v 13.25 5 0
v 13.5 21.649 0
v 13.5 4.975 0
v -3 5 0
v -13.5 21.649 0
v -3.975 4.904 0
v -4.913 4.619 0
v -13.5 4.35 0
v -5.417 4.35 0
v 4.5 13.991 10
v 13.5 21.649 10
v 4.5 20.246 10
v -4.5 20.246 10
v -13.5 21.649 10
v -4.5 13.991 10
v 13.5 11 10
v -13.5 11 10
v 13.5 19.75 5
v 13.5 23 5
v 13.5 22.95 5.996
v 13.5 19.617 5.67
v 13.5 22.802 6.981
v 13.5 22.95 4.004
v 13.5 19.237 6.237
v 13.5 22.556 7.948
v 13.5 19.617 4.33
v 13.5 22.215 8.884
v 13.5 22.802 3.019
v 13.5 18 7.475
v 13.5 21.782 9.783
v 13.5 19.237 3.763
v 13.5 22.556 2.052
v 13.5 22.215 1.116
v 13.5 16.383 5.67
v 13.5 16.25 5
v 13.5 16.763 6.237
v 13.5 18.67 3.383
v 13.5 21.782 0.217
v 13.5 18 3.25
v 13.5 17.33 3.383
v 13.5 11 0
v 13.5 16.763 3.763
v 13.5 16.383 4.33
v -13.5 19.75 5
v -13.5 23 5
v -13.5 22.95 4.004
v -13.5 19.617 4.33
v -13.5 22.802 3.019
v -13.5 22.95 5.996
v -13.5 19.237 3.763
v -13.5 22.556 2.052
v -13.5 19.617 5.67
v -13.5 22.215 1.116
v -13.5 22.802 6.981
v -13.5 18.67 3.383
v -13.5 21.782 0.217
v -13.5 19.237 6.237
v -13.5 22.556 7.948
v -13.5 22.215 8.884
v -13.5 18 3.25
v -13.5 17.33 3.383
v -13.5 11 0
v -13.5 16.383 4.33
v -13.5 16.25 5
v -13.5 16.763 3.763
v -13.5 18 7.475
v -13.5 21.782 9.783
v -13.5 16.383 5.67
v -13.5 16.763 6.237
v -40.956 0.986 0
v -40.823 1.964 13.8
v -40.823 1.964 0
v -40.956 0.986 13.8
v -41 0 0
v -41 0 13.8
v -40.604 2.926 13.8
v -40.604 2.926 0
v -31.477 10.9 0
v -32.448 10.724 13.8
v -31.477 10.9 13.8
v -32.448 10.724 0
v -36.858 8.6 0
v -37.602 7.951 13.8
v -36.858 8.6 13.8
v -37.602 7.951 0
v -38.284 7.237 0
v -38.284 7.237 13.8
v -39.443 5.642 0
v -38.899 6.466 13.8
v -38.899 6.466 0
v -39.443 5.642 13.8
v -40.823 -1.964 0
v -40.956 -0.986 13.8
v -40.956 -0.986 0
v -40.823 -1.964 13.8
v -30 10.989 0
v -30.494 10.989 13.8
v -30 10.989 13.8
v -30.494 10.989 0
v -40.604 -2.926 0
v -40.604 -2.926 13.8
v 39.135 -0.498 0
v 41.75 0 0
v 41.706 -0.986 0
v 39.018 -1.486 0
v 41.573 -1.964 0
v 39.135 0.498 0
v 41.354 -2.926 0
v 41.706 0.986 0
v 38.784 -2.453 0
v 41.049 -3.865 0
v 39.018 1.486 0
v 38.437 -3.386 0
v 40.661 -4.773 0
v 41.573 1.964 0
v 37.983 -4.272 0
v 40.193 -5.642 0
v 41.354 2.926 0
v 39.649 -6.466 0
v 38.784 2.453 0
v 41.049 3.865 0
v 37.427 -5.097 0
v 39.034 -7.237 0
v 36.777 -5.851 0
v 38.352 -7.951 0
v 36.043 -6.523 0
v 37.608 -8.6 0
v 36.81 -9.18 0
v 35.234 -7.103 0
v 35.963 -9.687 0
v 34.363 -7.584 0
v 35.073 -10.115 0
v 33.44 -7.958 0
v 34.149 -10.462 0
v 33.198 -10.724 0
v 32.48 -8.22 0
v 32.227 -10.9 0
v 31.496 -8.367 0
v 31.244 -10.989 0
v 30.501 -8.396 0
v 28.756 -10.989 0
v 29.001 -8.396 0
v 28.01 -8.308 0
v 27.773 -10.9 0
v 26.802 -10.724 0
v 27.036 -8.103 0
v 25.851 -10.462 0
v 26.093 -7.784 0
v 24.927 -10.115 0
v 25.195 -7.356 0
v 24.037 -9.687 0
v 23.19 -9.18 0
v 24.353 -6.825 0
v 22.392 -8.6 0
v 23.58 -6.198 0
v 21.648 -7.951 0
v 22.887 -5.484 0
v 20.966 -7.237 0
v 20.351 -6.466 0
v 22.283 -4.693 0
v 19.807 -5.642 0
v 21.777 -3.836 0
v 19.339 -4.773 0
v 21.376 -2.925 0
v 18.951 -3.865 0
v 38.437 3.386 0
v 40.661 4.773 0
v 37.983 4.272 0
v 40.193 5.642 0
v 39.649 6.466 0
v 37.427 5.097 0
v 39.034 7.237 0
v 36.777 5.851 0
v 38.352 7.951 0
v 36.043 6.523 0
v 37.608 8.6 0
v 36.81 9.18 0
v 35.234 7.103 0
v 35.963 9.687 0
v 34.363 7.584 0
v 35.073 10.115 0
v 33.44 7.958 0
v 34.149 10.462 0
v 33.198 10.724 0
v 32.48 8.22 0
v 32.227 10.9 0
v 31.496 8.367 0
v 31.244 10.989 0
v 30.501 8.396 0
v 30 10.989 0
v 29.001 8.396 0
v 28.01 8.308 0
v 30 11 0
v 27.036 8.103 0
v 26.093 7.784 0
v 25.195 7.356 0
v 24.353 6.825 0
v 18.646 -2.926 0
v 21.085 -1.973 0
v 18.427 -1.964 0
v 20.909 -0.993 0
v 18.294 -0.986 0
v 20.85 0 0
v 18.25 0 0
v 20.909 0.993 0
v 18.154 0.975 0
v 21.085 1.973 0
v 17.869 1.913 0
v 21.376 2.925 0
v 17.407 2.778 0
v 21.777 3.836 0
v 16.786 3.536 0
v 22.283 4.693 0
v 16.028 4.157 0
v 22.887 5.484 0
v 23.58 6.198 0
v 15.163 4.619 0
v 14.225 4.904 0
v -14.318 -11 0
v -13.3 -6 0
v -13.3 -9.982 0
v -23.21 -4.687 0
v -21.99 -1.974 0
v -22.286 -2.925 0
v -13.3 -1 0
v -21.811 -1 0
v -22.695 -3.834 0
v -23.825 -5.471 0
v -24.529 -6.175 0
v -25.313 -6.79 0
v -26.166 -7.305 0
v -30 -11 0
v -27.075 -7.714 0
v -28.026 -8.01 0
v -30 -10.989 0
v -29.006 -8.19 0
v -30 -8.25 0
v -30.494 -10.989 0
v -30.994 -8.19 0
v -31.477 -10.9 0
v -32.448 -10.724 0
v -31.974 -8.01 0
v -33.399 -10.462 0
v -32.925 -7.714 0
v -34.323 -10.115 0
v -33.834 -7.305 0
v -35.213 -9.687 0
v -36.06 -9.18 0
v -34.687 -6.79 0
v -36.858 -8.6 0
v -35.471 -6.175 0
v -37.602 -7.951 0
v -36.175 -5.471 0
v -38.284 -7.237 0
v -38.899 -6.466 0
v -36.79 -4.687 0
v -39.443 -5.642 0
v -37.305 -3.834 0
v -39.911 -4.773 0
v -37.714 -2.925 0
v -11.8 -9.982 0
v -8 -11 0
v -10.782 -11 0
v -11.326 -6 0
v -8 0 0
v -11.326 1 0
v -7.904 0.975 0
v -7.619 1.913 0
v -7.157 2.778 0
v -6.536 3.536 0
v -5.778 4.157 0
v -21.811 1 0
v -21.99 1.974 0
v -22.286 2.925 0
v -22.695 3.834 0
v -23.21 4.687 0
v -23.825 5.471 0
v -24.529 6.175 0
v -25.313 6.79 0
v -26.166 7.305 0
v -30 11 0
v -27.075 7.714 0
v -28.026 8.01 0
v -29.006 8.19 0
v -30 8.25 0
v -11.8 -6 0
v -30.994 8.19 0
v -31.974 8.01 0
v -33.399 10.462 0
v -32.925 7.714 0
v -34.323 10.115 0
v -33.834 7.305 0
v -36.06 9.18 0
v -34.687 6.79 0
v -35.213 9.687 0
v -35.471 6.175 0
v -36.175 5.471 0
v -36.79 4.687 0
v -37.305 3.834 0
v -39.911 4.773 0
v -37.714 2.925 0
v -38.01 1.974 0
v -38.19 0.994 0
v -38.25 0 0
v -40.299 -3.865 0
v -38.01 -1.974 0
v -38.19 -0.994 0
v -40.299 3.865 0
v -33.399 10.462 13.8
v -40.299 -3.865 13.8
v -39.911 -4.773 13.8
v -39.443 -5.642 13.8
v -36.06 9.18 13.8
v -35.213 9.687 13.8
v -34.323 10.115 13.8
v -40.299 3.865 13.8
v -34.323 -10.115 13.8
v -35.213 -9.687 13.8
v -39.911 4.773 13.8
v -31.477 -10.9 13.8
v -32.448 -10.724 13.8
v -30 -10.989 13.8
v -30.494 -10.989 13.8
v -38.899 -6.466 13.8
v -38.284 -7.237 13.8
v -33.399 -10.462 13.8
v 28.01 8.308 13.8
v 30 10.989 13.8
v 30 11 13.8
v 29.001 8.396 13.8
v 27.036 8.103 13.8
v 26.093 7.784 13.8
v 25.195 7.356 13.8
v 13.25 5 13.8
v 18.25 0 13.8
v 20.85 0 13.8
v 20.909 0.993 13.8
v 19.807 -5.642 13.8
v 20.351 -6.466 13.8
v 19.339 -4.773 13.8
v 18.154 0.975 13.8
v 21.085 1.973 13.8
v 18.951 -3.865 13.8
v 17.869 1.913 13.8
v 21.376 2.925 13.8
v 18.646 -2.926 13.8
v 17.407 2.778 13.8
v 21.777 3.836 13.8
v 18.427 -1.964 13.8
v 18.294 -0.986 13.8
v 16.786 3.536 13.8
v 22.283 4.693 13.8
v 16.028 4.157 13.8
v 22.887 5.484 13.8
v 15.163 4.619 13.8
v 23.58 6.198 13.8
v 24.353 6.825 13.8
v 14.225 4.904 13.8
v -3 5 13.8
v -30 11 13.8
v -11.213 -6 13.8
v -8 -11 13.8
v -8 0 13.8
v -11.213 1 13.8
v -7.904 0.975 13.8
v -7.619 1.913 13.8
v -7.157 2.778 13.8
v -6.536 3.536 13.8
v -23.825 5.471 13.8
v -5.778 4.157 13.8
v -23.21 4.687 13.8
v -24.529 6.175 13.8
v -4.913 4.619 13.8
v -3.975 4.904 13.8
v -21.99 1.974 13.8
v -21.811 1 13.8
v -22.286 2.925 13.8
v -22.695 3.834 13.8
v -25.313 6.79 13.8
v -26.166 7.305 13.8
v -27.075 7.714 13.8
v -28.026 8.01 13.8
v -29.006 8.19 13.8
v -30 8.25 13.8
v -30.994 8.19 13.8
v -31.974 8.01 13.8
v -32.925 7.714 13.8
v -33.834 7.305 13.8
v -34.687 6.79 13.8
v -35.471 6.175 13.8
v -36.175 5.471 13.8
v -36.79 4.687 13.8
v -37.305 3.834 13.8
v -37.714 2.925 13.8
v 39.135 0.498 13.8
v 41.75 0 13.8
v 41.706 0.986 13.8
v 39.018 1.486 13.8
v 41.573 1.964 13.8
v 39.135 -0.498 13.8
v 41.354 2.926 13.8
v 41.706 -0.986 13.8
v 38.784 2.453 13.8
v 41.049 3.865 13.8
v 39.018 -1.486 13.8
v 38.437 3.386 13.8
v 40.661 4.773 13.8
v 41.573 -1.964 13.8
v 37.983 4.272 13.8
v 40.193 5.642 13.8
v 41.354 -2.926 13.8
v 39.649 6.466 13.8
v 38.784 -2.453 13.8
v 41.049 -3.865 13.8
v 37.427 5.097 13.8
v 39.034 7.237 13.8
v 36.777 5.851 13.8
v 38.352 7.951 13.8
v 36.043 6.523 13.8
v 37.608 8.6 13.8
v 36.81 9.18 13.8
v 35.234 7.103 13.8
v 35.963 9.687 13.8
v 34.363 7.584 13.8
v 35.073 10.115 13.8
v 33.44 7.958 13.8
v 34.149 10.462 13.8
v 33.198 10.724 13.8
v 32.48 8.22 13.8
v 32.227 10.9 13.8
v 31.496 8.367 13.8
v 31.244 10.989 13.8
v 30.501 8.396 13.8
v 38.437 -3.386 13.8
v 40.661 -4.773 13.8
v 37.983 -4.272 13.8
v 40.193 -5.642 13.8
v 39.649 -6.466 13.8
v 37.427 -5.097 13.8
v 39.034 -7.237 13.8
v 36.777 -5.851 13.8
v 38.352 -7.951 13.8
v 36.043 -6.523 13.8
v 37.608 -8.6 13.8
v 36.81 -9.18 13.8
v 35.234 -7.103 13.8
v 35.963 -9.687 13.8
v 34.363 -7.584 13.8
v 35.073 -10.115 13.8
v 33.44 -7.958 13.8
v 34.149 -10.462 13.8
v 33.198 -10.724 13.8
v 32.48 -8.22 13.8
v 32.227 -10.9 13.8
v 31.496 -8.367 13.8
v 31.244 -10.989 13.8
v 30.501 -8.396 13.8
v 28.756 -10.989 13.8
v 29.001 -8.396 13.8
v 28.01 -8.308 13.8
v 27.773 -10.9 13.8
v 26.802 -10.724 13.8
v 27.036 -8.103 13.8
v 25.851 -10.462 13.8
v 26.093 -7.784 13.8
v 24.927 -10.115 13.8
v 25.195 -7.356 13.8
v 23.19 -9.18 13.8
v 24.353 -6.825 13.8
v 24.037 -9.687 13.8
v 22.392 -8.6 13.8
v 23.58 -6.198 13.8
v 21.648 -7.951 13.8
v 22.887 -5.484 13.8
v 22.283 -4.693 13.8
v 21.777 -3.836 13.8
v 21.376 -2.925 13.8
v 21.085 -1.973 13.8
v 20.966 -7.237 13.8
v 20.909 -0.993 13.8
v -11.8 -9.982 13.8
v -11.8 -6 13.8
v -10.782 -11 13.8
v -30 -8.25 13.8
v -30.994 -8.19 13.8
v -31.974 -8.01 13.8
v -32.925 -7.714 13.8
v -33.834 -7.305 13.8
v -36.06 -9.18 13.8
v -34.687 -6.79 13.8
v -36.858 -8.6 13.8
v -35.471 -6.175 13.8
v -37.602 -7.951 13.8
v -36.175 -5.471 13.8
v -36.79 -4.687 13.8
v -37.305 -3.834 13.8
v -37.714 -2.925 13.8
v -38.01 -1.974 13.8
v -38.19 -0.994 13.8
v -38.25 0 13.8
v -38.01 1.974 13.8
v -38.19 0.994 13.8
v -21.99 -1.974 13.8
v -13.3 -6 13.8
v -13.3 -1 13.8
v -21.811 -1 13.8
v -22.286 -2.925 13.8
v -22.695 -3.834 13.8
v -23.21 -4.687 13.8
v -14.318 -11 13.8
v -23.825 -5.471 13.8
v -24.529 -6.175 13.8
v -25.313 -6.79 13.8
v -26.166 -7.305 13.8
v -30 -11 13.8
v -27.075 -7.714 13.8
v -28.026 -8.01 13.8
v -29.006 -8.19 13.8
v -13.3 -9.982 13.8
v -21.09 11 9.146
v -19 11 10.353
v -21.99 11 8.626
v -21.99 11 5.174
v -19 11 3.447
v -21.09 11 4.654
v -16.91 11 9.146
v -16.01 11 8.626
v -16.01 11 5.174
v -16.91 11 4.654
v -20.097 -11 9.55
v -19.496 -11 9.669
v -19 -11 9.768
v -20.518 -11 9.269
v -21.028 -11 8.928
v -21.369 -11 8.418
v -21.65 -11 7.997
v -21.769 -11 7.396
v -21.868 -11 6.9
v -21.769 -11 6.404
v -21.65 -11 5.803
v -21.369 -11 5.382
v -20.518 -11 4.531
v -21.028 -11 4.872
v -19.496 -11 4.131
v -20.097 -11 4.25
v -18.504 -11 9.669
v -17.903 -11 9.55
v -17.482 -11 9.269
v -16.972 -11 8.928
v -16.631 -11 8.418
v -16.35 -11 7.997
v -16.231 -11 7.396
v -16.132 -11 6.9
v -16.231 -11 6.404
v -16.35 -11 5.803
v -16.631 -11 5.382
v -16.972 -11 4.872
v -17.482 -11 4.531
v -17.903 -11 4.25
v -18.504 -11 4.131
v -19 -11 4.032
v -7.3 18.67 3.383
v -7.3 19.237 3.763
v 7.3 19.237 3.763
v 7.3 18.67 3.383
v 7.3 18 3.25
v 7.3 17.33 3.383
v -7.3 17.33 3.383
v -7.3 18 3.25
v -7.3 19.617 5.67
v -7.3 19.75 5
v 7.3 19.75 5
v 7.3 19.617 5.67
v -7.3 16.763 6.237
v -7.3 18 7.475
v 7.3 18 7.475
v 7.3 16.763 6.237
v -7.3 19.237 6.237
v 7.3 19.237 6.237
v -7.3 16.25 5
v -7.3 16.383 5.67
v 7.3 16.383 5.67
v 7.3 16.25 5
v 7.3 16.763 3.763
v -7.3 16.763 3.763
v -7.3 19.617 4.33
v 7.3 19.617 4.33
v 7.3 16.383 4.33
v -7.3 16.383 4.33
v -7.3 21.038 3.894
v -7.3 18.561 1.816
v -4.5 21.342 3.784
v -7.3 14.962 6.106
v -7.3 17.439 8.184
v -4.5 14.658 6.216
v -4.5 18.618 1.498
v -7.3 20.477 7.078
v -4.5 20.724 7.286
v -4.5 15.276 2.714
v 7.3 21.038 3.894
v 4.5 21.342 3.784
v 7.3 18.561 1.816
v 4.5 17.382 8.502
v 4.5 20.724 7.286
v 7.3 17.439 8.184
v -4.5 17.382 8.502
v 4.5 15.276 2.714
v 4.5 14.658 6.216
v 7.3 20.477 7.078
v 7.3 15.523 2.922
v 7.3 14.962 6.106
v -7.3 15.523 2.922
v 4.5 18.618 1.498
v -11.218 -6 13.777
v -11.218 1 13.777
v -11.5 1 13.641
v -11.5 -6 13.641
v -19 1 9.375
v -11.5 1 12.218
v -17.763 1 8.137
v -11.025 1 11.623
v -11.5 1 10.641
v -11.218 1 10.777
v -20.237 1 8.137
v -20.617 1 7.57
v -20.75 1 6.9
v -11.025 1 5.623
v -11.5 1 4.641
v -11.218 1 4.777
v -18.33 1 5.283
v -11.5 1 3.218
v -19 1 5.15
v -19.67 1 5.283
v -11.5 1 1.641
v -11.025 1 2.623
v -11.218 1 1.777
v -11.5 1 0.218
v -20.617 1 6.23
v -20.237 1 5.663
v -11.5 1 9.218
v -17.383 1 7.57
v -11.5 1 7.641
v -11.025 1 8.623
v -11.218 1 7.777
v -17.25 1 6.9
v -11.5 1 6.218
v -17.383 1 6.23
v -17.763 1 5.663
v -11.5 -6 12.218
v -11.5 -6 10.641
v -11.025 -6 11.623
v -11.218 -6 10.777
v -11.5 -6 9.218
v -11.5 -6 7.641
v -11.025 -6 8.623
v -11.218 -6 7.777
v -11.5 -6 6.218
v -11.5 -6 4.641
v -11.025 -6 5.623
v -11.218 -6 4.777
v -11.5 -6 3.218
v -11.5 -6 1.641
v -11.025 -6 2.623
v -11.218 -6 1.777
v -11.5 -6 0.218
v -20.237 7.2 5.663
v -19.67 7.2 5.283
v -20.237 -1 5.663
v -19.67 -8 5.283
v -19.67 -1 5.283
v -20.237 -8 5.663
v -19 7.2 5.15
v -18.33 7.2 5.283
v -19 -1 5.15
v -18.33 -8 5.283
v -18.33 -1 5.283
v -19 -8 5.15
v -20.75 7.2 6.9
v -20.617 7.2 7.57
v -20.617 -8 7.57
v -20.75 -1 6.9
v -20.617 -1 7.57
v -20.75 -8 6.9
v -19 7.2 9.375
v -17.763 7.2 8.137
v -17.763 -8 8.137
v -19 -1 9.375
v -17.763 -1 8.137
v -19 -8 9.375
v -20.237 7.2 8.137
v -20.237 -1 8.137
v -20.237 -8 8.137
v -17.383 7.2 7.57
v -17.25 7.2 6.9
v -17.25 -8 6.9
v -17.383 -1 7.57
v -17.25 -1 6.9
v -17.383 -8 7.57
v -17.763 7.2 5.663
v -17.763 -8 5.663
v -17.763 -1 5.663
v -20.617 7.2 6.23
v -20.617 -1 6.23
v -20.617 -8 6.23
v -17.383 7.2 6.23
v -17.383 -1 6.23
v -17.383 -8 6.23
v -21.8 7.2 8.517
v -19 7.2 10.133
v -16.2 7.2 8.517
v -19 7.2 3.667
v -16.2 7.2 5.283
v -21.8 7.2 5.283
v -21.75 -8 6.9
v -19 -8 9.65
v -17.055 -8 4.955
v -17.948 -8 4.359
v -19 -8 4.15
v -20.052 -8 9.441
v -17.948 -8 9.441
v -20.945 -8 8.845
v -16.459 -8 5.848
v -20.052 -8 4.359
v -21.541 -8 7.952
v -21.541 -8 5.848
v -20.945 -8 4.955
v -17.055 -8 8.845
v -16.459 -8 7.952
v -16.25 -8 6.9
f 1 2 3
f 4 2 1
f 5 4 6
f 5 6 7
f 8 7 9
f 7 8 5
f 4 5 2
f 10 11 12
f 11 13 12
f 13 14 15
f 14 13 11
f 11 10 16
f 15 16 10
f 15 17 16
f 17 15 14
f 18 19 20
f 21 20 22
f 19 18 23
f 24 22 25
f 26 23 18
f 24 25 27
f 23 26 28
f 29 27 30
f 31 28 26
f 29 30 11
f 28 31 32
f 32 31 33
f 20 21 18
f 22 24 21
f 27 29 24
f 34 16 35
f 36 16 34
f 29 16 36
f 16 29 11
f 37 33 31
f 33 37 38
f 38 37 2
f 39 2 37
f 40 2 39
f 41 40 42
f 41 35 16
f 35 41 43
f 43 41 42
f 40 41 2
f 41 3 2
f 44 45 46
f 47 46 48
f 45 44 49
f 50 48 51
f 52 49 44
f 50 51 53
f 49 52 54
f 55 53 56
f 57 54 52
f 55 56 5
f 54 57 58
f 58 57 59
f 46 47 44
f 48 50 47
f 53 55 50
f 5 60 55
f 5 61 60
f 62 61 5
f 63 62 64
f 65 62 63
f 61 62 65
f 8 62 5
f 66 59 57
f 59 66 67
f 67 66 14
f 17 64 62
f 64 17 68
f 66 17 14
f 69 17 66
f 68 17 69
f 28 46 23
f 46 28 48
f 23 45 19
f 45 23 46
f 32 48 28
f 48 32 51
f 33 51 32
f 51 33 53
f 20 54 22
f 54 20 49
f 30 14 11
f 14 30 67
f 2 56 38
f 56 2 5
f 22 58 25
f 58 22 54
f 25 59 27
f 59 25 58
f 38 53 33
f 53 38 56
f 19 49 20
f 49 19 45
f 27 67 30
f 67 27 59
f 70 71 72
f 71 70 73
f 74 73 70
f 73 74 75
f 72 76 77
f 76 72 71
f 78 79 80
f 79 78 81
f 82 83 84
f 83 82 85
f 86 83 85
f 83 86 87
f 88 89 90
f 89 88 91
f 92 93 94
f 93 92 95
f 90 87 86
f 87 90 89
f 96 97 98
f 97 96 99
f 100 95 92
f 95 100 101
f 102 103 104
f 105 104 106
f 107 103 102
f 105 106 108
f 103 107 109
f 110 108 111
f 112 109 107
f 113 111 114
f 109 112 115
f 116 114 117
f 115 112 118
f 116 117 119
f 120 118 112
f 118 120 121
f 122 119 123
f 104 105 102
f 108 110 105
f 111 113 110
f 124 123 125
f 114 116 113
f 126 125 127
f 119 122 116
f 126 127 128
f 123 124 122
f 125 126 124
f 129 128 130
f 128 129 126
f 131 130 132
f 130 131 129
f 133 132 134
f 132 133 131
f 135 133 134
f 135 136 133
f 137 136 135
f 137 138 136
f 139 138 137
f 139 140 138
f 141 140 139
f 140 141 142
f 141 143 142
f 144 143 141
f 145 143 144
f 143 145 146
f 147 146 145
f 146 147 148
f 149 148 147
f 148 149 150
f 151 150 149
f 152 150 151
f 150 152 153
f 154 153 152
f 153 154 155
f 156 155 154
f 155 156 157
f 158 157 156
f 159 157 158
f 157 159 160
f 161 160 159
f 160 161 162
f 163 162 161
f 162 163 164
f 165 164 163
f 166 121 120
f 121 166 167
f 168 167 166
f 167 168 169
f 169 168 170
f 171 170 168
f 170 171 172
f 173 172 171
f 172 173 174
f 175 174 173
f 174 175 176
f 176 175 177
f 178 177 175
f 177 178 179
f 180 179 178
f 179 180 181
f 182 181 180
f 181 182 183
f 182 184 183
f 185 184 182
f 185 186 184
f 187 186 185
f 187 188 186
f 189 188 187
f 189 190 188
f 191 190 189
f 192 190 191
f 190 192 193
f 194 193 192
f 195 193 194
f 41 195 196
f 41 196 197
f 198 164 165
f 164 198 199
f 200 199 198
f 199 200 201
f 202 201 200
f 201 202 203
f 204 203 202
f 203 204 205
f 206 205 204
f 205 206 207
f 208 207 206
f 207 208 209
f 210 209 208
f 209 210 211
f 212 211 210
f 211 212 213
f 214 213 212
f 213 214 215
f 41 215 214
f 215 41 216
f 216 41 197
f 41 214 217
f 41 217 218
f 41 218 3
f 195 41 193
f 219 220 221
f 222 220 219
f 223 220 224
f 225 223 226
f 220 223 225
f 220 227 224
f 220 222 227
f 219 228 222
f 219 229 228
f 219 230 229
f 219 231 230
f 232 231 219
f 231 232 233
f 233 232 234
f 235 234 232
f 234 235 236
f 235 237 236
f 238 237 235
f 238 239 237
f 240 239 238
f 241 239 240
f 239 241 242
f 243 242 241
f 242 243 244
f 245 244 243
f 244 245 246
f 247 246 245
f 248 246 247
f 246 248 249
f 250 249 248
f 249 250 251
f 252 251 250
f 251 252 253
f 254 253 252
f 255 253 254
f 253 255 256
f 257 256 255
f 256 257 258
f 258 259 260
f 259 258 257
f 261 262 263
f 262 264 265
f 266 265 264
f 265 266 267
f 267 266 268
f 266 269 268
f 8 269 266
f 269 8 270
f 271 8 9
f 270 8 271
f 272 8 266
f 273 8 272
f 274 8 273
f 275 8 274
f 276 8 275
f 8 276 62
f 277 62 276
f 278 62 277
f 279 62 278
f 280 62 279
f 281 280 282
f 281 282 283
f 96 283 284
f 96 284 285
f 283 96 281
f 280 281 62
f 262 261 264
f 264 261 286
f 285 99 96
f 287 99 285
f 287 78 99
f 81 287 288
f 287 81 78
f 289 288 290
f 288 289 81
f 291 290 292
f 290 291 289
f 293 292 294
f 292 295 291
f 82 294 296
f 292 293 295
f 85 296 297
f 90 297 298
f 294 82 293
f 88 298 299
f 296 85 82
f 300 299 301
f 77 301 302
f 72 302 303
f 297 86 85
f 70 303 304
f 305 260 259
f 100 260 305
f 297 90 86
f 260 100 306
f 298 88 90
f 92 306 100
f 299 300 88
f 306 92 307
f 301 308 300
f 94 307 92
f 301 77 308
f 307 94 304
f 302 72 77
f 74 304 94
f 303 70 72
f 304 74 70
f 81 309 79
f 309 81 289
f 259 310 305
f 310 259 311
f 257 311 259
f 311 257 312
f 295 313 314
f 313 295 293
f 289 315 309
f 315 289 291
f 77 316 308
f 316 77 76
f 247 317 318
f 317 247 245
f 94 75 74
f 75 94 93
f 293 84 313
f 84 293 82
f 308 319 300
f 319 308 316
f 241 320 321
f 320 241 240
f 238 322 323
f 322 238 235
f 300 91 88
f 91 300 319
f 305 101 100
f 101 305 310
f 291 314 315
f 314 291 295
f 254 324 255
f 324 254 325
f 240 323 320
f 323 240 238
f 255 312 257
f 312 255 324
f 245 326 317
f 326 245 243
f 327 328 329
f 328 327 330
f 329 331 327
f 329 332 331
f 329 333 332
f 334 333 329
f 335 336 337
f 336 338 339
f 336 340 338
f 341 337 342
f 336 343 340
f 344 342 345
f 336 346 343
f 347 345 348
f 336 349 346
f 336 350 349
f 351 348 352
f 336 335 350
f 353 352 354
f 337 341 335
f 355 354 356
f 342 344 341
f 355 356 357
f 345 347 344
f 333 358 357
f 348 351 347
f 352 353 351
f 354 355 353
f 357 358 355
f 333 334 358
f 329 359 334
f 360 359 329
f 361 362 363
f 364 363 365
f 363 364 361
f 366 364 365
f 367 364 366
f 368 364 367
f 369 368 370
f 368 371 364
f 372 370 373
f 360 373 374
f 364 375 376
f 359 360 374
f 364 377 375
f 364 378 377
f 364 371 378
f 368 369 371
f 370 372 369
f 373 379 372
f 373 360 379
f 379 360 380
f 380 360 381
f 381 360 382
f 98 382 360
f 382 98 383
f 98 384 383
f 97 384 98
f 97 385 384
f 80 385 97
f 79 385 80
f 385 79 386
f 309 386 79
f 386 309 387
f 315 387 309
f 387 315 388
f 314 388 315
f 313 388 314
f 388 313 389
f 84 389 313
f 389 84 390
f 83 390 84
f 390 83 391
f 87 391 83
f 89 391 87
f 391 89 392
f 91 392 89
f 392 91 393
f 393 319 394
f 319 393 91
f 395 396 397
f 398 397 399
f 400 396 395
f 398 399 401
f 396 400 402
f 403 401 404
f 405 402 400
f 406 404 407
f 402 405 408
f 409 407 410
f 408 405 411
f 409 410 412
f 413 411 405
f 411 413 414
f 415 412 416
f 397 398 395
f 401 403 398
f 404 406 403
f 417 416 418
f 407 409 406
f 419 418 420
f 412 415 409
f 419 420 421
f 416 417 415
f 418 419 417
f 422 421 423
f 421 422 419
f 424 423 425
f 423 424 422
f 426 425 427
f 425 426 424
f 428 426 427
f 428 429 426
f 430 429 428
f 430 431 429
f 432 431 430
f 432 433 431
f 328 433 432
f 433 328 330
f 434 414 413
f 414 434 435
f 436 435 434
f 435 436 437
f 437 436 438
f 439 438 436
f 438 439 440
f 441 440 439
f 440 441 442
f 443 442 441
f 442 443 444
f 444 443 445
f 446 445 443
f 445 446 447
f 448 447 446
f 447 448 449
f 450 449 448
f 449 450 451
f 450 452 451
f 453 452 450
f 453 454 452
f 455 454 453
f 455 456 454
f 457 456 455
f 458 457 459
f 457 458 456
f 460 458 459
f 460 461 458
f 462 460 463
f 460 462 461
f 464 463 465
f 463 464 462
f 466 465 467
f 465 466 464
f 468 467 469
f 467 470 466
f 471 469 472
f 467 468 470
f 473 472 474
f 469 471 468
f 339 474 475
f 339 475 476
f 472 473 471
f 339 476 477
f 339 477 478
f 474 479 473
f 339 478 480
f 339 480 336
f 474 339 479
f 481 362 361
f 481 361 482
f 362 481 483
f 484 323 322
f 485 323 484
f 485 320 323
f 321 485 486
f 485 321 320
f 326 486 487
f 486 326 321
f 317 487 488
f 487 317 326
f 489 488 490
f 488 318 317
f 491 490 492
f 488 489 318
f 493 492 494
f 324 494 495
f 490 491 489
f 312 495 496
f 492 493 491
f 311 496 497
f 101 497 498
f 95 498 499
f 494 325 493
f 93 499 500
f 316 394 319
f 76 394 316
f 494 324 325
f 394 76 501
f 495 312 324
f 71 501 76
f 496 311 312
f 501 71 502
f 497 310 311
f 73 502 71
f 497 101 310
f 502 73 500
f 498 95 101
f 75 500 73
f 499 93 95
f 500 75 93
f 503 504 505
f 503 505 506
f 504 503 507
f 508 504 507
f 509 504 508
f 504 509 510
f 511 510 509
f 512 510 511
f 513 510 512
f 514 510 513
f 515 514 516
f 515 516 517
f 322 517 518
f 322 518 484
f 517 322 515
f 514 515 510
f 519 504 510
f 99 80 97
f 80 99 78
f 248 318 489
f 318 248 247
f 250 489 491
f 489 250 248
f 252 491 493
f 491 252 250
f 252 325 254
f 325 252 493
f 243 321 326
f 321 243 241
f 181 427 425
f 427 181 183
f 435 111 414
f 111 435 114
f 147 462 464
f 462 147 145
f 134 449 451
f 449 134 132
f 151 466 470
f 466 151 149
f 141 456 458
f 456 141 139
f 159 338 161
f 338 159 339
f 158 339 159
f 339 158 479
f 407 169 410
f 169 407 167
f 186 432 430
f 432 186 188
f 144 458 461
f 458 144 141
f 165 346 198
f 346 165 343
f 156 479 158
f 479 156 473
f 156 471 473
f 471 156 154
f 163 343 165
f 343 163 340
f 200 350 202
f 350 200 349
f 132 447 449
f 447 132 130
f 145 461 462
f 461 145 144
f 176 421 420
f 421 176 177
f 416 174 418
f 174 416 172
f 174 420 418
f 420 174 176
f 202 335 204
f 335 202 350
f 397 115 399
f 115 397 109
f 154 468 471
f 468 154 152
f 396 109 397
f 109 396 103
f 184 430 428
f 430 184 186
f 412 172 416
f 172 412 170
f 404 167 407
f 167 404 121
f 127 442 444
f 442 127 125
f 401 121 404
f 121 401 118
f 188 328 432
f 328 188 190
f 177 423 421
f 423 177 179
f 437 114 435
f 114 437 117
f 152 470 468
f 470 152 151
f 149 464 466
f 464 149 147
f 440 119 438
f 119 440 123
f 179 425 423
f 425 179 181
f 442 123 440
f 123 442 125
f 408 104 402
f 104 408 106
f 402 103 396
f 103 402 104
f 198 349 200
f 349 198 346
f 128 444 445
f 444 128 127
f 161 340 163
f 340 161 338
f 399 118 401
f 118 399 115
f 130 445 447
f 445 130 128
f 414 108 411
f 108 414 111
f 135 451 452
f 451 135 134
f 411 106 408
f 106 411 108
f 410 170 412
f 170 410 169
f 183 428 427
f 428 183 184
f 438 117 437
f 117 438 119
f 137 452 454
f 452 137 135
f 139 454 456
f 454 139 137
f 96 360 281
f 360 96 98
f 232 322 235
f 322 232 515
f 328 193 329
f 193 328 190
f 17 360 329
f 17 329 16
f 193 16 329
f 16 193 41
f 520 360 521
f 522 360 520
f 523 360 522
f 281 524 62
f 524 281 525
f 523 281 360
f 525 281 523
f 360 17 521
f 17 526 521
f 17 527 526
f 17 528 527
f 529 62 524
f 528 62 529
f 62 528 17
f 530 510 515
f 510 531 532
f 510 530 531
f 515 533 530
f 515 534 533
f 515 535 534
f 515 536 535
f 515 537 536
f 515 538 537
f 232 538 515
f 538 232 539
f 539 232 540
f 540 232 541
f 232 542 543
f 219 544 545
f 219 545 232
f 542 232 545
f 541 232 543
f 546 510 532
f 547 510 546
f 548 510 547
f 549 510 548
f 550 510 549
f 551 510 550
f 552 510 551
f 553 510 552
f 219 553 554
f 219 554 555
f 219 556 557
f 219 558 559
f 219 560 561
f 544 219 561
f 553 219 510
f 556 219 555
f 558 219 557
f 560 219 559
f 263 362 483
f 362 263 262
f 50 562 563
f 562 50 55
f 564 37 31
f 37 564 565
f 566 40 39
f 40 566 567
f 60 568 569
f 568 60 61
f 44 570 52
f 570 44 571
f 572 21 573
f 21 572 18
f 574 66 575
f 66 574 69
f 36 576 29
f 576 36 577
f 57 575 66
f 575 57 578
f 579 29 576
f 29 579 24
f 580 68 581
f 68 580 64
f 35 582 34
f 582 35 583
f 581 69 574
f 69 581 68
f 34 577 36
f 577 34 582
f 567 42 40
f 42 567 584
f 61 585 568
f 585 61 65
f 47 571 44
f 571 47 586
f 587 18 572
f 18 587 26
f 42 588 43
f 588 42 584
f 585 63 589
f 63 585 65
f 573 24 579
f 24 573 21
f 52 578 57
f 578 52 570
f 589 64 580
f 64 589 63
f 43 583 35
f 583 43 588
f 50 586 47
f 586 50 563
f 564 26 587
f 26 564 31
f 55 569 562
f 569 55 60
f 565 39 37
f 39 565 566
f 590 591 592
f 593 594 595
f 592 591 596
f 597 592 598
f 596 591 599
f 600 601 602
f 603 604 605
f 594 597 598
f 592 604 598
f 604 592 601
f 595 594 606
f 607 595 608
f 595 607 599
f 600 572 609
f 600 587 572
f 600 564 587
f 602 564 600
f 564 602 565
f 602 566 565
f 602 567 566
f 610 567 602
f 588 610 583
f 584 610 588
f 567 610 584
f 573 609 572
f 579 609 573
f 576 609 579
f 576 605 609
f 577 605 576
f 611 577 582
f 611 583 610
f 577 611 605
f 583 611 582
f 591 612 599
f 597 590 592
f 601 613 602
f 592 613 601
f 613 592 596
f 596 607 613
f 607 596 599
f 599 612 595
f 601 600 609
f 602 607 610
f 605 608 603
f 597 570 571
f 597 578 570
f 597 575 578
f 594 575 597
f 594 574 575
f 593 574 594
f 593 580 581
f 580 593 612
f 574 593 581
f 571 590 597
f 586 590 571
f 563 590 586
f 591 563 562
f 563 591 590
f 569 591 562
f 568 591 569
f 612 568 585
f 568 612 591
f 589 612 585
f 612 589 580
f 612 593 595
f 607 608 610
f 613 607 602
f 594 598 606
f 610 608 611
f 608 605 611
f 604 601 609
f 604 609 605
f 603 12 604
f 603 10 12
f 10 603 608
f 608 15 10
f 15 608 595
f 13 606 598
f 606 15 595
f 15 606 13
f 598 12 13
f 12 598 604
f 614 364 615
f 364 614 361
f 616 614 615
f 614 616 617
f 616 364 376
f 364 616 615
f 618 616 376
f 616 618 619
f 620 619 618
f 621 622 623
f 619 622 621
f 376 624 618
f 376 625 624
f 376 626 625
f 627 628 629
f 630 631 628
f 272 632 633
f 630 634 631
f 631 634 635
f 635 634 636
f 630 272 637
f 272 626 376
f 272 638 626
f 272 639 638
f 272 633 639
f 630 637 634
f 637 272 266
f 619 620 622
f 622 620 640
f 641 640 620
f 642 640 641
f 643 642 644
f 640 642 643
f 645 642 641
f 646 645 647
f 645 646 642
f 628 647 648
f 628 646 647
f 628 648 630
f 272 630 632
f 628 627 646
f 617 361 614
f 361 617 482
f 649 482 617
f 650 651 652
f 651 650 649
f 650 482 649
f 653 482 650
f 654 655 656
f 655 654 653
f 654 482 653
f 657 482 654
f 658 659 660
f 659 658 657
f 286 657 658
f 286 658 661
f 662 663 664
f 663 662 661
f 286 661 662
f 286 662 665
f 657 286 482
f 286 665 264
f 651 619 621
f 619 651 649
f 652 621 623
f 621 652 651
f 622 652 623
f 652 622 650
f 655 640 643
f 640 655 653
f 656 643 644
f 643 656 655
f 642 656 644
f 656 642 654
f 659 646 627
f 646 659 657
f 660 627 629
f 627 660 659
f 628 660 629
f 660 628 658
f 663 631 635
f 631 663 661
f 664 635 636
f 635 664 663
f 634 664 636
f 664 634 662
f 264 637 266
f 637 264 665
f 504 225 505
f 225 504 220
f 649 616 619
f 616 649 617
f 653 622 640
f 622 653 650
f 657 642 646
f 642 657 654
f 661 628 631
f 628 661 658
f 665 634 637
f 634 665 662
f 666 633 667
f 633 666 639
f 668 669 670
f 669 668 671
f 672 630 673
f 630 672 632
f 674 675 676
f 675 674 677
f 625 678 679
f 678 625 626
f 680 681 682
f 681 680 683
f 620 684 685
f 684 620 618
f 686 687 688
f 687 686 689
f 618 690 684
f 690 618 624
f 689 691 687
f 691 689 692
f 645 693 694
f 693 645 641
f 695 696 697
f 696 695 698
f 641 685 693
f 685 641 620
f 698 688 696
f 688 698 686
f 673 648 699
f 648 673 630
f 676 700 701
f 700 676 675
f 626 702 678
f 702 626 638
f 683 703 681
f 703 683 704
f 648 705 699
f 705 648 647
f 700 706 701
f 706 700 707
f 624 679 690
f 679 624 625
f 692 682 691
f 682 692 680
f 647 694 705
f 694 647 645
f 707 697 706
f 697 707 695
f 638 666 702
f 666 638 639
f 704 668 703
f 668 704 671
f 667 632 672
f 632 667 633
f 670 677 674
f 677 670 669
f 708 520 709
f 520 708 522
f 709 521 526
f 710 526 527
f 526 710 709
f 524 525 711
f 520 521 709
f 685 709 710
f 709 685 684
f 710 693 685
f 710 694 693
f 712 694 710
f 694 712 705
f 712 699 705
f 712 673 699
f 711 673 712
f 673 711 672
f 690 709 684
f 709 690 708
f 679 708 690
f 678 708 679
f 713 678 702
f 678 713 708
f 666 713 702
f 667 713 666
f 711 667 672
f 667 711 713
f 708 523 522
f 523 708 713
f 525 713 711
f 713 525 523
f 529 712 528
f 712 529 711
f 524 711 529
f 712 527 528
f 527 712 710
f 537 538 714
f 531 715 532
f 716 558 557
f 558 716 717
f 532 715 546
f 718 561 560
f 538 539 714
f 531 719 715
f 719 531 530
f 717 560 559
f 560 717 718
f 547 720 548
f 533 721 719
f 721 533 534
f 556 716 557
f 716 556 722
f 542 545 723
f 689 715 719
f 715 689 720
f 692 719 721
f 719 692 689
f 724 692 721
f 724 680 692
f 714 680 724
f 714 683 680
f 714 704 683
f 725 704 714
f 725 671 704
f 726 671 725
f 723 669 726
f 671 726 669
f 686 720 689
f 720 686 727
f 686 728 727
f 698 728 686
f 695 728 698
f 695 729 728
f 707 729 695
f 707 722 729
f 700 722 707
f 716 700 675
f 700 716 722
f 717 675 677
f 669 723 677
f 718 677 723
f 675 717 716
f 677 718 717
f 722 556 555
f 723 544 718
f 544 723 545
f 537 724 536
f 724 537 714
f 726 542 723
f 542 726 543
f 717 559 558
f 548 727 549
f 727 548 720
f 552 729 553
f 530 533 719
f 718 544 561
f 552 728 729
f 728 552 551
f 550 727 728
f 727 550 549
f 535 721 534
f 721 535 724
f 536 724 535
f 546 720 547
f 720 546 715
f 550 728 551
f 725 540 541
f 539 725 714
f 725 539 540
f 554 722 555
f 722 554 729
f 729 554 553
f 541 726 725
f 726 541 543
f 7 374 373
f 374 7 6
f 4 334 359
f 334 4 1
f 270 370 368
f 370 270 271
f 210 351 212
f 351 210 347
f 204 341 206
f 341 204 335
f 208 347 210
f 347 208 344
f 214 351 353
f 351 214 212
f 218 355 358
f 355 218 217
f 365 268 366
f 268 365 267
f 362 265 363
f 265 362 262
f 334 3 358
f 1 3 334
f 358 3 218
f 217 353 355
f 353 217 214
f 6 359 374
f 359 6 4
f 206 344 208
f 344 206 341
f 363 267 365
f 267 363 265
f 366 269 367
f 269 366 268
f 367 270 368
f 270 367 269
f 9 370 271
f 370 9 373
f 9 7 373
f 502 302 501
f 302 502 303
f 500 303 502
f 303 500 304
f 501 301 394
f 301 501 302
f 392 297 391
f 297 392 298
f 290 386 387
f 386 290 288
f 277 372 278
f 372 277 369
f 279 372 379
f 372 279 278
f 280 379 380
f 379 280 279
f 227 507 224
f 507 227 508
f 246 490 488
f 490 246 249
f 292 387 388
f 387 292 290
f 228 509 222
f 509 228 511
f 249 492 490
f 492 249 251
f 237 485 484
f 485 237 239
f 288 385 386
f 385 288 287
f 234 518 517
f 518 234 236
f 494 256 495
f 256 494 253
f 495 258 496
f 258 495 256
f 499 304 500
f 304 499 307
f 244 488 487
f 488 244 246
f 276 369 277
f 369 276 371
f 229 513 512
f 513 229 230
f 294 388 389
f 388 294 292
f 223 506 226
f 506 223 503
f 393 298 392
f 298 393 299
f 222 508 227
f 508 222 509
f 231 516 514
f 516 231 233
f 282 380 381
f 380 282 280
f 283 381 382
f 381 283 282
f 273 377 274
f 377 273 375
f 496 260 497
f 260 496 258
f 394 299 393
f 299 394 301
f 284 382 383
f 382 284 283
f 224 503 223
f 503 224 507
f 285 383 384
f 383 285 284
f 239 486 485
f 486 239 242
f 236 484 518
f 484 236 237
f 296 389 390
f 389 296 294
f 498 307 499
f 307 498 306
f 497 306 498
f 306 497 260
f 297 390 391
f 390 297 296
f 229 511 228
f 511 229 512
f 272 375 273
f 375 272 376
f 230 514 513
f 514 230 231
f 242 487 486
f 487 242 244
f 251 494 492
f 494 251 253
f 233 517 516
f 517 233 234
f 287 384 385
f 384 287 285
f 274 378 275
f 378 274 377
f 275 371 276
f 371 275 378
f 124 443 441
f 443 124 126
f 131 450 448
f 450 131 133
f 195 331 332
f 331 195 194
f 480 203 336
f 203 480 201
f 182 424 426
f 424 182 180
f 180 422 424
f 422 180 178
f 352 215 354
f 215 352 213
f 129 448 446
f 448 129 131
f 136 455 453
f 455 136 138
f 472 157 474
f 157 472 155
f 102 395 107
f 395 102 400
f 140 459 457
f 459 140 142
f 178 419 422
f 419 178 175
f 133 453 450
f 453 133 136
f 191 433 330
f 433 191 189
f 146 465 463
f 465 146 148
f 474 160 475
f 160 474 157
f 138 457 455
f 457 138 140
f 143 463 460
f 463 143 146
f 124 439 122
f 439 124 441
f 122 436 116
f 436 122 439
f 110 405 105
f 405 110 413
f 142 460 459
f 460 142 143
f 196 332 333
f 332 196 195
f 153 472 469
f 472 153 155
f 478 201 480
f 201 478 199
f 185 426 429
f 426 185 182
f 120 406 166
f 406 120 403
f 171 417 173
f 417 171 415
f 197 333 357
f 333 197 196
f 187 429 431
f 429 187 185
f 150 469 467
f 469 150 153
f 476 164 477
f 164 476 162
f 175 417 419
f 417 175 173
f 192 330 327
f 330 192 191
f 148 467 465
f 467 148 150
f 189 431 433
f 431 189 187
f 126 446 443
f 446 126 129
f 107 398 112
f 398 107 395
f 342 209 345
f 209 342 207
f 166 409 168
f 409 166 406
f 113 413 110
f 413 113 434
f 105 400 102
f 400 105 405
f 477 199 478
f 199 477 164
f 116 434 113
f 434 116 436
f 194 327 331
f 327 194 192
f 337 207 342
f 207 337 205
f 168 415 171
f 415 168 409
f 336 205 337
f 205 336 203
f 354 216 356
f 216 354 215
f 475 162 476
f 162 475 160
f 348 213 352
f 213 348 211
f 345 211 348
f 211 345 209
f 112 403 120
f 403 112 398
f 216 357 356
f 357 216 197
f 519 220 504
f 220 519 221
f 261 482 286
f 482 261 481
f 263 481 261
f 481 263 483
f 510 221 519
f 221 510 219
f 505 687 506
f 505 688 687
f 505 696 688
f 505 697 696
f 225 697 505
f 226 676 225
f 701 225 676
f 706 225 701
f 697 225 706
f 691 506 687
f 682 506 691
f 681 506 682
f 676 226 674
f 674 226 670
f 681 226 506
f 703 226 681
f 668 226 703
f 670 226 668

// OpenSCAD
// file: ../standard_parts/ball.scad
include <../configuration.scad>;

$fa=2;
$fs=1;

//Kavan Maxi Ball Link 1408

module ball(env) {
	color("grey") difference() {
		union() {
			translate([-ball_offset,0,0]) sphere(r=3,center = true);
			translate([-ball_offset/2,0,0]) rotate([0,90,0]) cylinder( h = ball_offset, r = 3.8/2, center = true);
			translate([5,0,0]) rotate([0,90,0]) cylinder( h = 10, r = 1.5, center = true);
			translate([-0.5,0,0]) rotate([0,90,0]) cylinder( h = 1, r = (7*2/sqrt(3))/2, center = true, $fn = 6);
		}
		translate([-9.6,0,0]) rotate([0,90,0]) cylinder( h = 1, r = 4, center = true, $fn = 6);
	}
	if (env) {
		color("black",0.5) translate([-6.5,0,0]) sphere(r=5,center = true);
	}
}

ball();
//ball(true);
// file: ../library/udf.scad
//User Defined Features

//"THE BEER-WARE LICENSE" (Revision 42):
//<https://github.com/njprossi> wrote this file. As long as you retain this notice you
//can do whatever you want with this stuff. If we meet some day, and you think
//this stuff is worth it, you can buy me a beer in return.
//Nicolas Rossi

//Currently only for M3

nh=2.8;		//Nut height
ns=5.6;		//Nut 
sd=3.5;		//Screw main dia
shd=5.5;		//Screw head dia
shh=3.5;		//Screw head height

dr=1.1;		//Draft %

$fn=16;

module nut_well(length,position,height,angle,counterbore=false) {
	union() {
		translate([0,0,position+nh/2]) rotate([0,90,90+angle]) hull() {
			rotate([0,90,0]) cylinder(h=nh,r=ns/(sqrt(3)),center=true,$fn=6);
			translate([0,0,height+1]) cube([nh*dr,ns*dr,1],true);
		}
		reprap_hole(sd,length,true);
	}
	if (counterbore==true) counterbore(shh,shd);
}

module nut_well_2(length,distance,height,angle,counterbore=false) {
	union() {
		translate([0,0,-distance/2])reprap_hole(sd,distance+2,false);
		rotate([0,0,angle]) hull() for(a=[0,180]) rotate([0,a,0]) translate([0,0,-distance/2+length-nh]) rotate([0,0,90]) cylinder(h=nh,r1=ns/(sqrt(3)),r2=ns*dr/(sqrt(3)),center=false,$fn=6);
		rotate([0,0,angle]) translate([0,height/2,0]) cube([ns*dr,height,distance-2*length],true);
	}
	if (counterbore==true) counterbore(shh,shd);
}

module nut_cutout(length,angle,counterbore=false){
	reprap_hole(sd,length-1,false);
	translate([0,0,length]) rotate([0,0,90+angle]) cylinder(h=nh*2,r1=ns/(sqrt(3)),r2=ns*dr/(sqrt(3)),center=true,$fn=6);
	if (counterbore==true) counterbore(shh,shd);
}
module nut_cutout_2(length,angle,counterbore=false,overhang=false){
	translate([0,0,length/2-1]) cylinder(h=length+2, r=sd/2, center=true);
	translate([0,0,length]) rotate([0,0,90+angle]) cylinder(h=nh*2, r2=ns*dr/sqrt(3), r1=ns/sqrt(3), center = true,$fn=6);
	if (overhang==true) translate([0,0,length-nh-ns/4+.1]) cylinder(h=ns/2, r2=ns/2, r1=0, center = true);
	if (counterbore==true) counterbore(shh,shd);
}

module counterbore(h,d){
	translate([0,0,-h]) cylinder(h=h*2,r1=(d*dr)/2,r2=d/2,center=true,$fn=16);
}

module reprap_hole(diameter,length,sphere=false) {
		translate([0,0,length/2-1]) hull(){
			cylinder(h=length+2,r=diameter/2,center=true,$fn=16);
			translate([0,0,-length/2-1]) rotate([90,0,135]) cube([diameter/2,length+2,diameter/2],false);
			if (sphere==true) translate([0,0,length/2+1]) sphere(r=diameter/2,$fn=16);
		}
}

/* Test
difference() {
	translate([10,0,0])cube([20,10,10],true);
	nut_well(12,5,5,0);
	nut_cutout(12);
}
*/


translate([-10,0,5]) cube([5,5,10],true);
nut_well(10,6,5,0,true);
translate([10,0,0]) nut_well_2(10,40,5,15,false);
translate([20,0,0]) nut_cutout(10,0,true);
translate([30,0,0]) nut_cutout_2(10,0,true,true);
translate([40,0,0]) reprap_hole(5,10,true);
// file: ../configuration.scad
$fa = 3;
$fs = 1;

//Printed parts
motor_end_height=44;
idler_end_height=28;
carriage_height=13.8;
platform_thickness=10;
platform_fix_dia=28;
platform_dia=38;

//Standard parts
bearing_diameter=16;
bearing_height=24;
bearing_dia_clearence=0.5;
bearing_free_dia_clearence=0.8;

hotend_diameter=16.4;
hotend_groove_dia=12;

ball_link_distance=40; //Distance between two balls on carriage
ball_offset=6.5;
ball_distance=ball_link_distance-2*ball_offset;
ball_angle=25;
ball_link_offset=8; //Distance between ball center and diagonal rod

// Frames
// RAMPS = 1
motherboard=1;

motherboard_x=100;
motherboard_y=50;

frame_thickness=8;
frame_roundness=20;

// Distance from motor axle to idler axle
// Calculated regarding length of the HTD3M closed belt 
belt_length=1062;
//belt_length=1245;
belt_step=3;
pulley_tooth=26;
idler_diameter=22;
spacing = round((belt_length - (belt_step*pulley_tooth/(2*PI))/2 - idler_diameter*PI/2) / 2);

rod_length=spacing+motor_end_height/2+idler_end_height/2+2*frame_thickness;
rod_diameter=8;
rod_spacing=60; // Distance of 60mm is compatible with Rostock
//platform_hinge_offset=25;
//carriage_hinge_offset=17;

printbed_diameter=170;	//printable aera
//printbed_diameter=250;	//printable aera
printbed_thickness=4;		// used for rendering and approximating build volume


// Delta Settings
delta_smooth_rod_offset=139.5;
//delta_smooth_rod_offset=139.5+40;
delta_effector_offset=18;
delta_carriage_offset=18;
delta_diagonal_rod=ceil(max(printbed_diameter/2+delta_smooth_rod_offset-delta_effector_offset-delta_carriage_offset,printbed_diameter/(2*sin(ball_angle))));
delta_radius=(delta_smooth_rod_offset-delta_effector_offset-delta_carriage_offset);

diagonal_rod_length=delta_diagonal_rod-2*ball_link_offset;
diagonal_rod_diameter=3;

diagonal_rod_angle=acos(delta_radius/delta_diagonal_rod);

carriage_altitude=sqrt(pow(delta_diagonal_rod,2)-pow(delta_radius,2)); //Height between effector and carriage from ball center

echo_result=true;

if(echo_result) {
	echo("printbed_diameter",printbed_diameter);
	echo("delta_diagonal_rod",delta_diagonal_rod);
	echo("diagonal_rod_length",diagonal_rod_length);
	echo("delta_effector_offset",delta_effector_offset);
	echo("delta_carriage_offset",delta_carriage_offset);
	echo("delta_radius",delta_radius);
	echo("diagonal_rod_angle",diagonal_rod_angle);
	echo("carriage_altitude",carriage_altitude);
	echo("rod_length",rod_length);
}
// main file
include <../configuration.scad>
use <../library/udf.scad>
use <../standard_parts/ball.scad>;

echo_result=true;

module new_carriage() {
	bearing_od=bearing_diameter+6;
	bearing_radius=bearing_diameter/2;
	clamp_h=ceil(carriage_height/3)*3;
	color("red",1) difference() {
		union() {
			for(x = [1]) translate([x*rod_spacing/2,0,carriage_height/2])
				cylinder(h=carriage_height,d=bearing_od,center=true);
			hull() for(x = [-rod_spacing/2-0.75,-rod_spacing/2+0.75])
				translate([x,0,carriage_height/2]) {
					cylinder(h=carriage_height,d=bearing_od,center=true);
			}
			translate([0,(bearing_od)/4,carriage_height/2])
				cube([rod_spacing,(bearing_od)/2,carriage_height],true);
			translate([rod_spacing/4,-(bearing_od)/4,carriage_height/2])
				cube([rod_spacing/2,(bearing_od)/2,carriage_height],true);
			translate([0,delta_carriage_offset-platform_thickness/2,carriage_height-platform_thickness/2]) rotate([0,0,90]) intersection (){
				cube([platform_thickness*2,(ball_distance),platform_thickness],true);
				rotate([90,0,0])
					cylinder(h = ball_distance*2, r=platform_thickness,center = true);
			}
		}
		union() {
			hull() for(x = [-rod_spacing/2+16.75,3]) translate([x,0,0]) union() {
				cylinder(h=carriage_height*3,r=10/2,center=true);
				translate([0,-6,0])
					cube([10,12,carriage_height*3],true);
			}

			//Holes for bearings
			translate([rod_spacing/2,0,0])
				cylinder(h=carriage_height*3,r=(bearing_diameter+bearing_dia_clearence)/2,center=true);
			hull() for(x = [-rod_spacing/2-0.75,-rod_spacing/2+0.75])
				translate([x,0,0])
					cylinder(h=carriage_height*3,r=(bearing_diameter+bearing_free_dia_clearence)/2,center=true);

			//Hole for magnets
			/*translate([16,6,platform_thickness])union() {
				cylinder(h=2.5*2,r1=5.4/2,r2=5.4*1.1/2,center=true);
				translate([0,0,1.9]) cylinder(h=2,r1=5.4/2,r2=2/2,center=false);
			}*/

			//Holes for ball links
			translate([0,delta_carriage_offset,carriage_height-platform_thickness/2])
				rotate([-90,0,90])
					nut_well_2(9,ball_distance,carriage_height+1,10,false);

			//Belt clamp
			translate([11,-2.5,carriage_height/2])
				rotate([-90,-90,0])
					translate([-clamp_h/2,1.3,0])
						union() {
							for(x=[0:3:clamp_h])
								translate([x,-0.3,0])
									cylinder(h=7,r=1,center=true);
							translate([-1,-0.8,-7/2])
								cube([clamp_h+2,1.8,7],false);
						}
			translate([11+1.55,-bearing_od/2,carriage_height/2])
				cube([1.5,bearing_od/2,clamp_h+2],true);
			translate([11+1.55,-bearing_od/2,carriage_height/2])
				rotate([0,0,45])
					cube([2.5,2.5,clamp_h+2],true);

			//Screw and nut hole for bearing clamp
			translate([(rod_spacing/2-bearing_radius-3),-bearing_od/2+3,carriage_height/2])
				rotate([-90,0,0])
					nut_cutout(18,0,true);

			//Bearing clamp
			translate([rod_spacing/4+3,0,0])
				cube([rod_spacing/2-19,2,carriage_height*3],true);
		}
	}
}

translate([0,0,carriage_height]) rotate([0,180,0]) new_carriage();
